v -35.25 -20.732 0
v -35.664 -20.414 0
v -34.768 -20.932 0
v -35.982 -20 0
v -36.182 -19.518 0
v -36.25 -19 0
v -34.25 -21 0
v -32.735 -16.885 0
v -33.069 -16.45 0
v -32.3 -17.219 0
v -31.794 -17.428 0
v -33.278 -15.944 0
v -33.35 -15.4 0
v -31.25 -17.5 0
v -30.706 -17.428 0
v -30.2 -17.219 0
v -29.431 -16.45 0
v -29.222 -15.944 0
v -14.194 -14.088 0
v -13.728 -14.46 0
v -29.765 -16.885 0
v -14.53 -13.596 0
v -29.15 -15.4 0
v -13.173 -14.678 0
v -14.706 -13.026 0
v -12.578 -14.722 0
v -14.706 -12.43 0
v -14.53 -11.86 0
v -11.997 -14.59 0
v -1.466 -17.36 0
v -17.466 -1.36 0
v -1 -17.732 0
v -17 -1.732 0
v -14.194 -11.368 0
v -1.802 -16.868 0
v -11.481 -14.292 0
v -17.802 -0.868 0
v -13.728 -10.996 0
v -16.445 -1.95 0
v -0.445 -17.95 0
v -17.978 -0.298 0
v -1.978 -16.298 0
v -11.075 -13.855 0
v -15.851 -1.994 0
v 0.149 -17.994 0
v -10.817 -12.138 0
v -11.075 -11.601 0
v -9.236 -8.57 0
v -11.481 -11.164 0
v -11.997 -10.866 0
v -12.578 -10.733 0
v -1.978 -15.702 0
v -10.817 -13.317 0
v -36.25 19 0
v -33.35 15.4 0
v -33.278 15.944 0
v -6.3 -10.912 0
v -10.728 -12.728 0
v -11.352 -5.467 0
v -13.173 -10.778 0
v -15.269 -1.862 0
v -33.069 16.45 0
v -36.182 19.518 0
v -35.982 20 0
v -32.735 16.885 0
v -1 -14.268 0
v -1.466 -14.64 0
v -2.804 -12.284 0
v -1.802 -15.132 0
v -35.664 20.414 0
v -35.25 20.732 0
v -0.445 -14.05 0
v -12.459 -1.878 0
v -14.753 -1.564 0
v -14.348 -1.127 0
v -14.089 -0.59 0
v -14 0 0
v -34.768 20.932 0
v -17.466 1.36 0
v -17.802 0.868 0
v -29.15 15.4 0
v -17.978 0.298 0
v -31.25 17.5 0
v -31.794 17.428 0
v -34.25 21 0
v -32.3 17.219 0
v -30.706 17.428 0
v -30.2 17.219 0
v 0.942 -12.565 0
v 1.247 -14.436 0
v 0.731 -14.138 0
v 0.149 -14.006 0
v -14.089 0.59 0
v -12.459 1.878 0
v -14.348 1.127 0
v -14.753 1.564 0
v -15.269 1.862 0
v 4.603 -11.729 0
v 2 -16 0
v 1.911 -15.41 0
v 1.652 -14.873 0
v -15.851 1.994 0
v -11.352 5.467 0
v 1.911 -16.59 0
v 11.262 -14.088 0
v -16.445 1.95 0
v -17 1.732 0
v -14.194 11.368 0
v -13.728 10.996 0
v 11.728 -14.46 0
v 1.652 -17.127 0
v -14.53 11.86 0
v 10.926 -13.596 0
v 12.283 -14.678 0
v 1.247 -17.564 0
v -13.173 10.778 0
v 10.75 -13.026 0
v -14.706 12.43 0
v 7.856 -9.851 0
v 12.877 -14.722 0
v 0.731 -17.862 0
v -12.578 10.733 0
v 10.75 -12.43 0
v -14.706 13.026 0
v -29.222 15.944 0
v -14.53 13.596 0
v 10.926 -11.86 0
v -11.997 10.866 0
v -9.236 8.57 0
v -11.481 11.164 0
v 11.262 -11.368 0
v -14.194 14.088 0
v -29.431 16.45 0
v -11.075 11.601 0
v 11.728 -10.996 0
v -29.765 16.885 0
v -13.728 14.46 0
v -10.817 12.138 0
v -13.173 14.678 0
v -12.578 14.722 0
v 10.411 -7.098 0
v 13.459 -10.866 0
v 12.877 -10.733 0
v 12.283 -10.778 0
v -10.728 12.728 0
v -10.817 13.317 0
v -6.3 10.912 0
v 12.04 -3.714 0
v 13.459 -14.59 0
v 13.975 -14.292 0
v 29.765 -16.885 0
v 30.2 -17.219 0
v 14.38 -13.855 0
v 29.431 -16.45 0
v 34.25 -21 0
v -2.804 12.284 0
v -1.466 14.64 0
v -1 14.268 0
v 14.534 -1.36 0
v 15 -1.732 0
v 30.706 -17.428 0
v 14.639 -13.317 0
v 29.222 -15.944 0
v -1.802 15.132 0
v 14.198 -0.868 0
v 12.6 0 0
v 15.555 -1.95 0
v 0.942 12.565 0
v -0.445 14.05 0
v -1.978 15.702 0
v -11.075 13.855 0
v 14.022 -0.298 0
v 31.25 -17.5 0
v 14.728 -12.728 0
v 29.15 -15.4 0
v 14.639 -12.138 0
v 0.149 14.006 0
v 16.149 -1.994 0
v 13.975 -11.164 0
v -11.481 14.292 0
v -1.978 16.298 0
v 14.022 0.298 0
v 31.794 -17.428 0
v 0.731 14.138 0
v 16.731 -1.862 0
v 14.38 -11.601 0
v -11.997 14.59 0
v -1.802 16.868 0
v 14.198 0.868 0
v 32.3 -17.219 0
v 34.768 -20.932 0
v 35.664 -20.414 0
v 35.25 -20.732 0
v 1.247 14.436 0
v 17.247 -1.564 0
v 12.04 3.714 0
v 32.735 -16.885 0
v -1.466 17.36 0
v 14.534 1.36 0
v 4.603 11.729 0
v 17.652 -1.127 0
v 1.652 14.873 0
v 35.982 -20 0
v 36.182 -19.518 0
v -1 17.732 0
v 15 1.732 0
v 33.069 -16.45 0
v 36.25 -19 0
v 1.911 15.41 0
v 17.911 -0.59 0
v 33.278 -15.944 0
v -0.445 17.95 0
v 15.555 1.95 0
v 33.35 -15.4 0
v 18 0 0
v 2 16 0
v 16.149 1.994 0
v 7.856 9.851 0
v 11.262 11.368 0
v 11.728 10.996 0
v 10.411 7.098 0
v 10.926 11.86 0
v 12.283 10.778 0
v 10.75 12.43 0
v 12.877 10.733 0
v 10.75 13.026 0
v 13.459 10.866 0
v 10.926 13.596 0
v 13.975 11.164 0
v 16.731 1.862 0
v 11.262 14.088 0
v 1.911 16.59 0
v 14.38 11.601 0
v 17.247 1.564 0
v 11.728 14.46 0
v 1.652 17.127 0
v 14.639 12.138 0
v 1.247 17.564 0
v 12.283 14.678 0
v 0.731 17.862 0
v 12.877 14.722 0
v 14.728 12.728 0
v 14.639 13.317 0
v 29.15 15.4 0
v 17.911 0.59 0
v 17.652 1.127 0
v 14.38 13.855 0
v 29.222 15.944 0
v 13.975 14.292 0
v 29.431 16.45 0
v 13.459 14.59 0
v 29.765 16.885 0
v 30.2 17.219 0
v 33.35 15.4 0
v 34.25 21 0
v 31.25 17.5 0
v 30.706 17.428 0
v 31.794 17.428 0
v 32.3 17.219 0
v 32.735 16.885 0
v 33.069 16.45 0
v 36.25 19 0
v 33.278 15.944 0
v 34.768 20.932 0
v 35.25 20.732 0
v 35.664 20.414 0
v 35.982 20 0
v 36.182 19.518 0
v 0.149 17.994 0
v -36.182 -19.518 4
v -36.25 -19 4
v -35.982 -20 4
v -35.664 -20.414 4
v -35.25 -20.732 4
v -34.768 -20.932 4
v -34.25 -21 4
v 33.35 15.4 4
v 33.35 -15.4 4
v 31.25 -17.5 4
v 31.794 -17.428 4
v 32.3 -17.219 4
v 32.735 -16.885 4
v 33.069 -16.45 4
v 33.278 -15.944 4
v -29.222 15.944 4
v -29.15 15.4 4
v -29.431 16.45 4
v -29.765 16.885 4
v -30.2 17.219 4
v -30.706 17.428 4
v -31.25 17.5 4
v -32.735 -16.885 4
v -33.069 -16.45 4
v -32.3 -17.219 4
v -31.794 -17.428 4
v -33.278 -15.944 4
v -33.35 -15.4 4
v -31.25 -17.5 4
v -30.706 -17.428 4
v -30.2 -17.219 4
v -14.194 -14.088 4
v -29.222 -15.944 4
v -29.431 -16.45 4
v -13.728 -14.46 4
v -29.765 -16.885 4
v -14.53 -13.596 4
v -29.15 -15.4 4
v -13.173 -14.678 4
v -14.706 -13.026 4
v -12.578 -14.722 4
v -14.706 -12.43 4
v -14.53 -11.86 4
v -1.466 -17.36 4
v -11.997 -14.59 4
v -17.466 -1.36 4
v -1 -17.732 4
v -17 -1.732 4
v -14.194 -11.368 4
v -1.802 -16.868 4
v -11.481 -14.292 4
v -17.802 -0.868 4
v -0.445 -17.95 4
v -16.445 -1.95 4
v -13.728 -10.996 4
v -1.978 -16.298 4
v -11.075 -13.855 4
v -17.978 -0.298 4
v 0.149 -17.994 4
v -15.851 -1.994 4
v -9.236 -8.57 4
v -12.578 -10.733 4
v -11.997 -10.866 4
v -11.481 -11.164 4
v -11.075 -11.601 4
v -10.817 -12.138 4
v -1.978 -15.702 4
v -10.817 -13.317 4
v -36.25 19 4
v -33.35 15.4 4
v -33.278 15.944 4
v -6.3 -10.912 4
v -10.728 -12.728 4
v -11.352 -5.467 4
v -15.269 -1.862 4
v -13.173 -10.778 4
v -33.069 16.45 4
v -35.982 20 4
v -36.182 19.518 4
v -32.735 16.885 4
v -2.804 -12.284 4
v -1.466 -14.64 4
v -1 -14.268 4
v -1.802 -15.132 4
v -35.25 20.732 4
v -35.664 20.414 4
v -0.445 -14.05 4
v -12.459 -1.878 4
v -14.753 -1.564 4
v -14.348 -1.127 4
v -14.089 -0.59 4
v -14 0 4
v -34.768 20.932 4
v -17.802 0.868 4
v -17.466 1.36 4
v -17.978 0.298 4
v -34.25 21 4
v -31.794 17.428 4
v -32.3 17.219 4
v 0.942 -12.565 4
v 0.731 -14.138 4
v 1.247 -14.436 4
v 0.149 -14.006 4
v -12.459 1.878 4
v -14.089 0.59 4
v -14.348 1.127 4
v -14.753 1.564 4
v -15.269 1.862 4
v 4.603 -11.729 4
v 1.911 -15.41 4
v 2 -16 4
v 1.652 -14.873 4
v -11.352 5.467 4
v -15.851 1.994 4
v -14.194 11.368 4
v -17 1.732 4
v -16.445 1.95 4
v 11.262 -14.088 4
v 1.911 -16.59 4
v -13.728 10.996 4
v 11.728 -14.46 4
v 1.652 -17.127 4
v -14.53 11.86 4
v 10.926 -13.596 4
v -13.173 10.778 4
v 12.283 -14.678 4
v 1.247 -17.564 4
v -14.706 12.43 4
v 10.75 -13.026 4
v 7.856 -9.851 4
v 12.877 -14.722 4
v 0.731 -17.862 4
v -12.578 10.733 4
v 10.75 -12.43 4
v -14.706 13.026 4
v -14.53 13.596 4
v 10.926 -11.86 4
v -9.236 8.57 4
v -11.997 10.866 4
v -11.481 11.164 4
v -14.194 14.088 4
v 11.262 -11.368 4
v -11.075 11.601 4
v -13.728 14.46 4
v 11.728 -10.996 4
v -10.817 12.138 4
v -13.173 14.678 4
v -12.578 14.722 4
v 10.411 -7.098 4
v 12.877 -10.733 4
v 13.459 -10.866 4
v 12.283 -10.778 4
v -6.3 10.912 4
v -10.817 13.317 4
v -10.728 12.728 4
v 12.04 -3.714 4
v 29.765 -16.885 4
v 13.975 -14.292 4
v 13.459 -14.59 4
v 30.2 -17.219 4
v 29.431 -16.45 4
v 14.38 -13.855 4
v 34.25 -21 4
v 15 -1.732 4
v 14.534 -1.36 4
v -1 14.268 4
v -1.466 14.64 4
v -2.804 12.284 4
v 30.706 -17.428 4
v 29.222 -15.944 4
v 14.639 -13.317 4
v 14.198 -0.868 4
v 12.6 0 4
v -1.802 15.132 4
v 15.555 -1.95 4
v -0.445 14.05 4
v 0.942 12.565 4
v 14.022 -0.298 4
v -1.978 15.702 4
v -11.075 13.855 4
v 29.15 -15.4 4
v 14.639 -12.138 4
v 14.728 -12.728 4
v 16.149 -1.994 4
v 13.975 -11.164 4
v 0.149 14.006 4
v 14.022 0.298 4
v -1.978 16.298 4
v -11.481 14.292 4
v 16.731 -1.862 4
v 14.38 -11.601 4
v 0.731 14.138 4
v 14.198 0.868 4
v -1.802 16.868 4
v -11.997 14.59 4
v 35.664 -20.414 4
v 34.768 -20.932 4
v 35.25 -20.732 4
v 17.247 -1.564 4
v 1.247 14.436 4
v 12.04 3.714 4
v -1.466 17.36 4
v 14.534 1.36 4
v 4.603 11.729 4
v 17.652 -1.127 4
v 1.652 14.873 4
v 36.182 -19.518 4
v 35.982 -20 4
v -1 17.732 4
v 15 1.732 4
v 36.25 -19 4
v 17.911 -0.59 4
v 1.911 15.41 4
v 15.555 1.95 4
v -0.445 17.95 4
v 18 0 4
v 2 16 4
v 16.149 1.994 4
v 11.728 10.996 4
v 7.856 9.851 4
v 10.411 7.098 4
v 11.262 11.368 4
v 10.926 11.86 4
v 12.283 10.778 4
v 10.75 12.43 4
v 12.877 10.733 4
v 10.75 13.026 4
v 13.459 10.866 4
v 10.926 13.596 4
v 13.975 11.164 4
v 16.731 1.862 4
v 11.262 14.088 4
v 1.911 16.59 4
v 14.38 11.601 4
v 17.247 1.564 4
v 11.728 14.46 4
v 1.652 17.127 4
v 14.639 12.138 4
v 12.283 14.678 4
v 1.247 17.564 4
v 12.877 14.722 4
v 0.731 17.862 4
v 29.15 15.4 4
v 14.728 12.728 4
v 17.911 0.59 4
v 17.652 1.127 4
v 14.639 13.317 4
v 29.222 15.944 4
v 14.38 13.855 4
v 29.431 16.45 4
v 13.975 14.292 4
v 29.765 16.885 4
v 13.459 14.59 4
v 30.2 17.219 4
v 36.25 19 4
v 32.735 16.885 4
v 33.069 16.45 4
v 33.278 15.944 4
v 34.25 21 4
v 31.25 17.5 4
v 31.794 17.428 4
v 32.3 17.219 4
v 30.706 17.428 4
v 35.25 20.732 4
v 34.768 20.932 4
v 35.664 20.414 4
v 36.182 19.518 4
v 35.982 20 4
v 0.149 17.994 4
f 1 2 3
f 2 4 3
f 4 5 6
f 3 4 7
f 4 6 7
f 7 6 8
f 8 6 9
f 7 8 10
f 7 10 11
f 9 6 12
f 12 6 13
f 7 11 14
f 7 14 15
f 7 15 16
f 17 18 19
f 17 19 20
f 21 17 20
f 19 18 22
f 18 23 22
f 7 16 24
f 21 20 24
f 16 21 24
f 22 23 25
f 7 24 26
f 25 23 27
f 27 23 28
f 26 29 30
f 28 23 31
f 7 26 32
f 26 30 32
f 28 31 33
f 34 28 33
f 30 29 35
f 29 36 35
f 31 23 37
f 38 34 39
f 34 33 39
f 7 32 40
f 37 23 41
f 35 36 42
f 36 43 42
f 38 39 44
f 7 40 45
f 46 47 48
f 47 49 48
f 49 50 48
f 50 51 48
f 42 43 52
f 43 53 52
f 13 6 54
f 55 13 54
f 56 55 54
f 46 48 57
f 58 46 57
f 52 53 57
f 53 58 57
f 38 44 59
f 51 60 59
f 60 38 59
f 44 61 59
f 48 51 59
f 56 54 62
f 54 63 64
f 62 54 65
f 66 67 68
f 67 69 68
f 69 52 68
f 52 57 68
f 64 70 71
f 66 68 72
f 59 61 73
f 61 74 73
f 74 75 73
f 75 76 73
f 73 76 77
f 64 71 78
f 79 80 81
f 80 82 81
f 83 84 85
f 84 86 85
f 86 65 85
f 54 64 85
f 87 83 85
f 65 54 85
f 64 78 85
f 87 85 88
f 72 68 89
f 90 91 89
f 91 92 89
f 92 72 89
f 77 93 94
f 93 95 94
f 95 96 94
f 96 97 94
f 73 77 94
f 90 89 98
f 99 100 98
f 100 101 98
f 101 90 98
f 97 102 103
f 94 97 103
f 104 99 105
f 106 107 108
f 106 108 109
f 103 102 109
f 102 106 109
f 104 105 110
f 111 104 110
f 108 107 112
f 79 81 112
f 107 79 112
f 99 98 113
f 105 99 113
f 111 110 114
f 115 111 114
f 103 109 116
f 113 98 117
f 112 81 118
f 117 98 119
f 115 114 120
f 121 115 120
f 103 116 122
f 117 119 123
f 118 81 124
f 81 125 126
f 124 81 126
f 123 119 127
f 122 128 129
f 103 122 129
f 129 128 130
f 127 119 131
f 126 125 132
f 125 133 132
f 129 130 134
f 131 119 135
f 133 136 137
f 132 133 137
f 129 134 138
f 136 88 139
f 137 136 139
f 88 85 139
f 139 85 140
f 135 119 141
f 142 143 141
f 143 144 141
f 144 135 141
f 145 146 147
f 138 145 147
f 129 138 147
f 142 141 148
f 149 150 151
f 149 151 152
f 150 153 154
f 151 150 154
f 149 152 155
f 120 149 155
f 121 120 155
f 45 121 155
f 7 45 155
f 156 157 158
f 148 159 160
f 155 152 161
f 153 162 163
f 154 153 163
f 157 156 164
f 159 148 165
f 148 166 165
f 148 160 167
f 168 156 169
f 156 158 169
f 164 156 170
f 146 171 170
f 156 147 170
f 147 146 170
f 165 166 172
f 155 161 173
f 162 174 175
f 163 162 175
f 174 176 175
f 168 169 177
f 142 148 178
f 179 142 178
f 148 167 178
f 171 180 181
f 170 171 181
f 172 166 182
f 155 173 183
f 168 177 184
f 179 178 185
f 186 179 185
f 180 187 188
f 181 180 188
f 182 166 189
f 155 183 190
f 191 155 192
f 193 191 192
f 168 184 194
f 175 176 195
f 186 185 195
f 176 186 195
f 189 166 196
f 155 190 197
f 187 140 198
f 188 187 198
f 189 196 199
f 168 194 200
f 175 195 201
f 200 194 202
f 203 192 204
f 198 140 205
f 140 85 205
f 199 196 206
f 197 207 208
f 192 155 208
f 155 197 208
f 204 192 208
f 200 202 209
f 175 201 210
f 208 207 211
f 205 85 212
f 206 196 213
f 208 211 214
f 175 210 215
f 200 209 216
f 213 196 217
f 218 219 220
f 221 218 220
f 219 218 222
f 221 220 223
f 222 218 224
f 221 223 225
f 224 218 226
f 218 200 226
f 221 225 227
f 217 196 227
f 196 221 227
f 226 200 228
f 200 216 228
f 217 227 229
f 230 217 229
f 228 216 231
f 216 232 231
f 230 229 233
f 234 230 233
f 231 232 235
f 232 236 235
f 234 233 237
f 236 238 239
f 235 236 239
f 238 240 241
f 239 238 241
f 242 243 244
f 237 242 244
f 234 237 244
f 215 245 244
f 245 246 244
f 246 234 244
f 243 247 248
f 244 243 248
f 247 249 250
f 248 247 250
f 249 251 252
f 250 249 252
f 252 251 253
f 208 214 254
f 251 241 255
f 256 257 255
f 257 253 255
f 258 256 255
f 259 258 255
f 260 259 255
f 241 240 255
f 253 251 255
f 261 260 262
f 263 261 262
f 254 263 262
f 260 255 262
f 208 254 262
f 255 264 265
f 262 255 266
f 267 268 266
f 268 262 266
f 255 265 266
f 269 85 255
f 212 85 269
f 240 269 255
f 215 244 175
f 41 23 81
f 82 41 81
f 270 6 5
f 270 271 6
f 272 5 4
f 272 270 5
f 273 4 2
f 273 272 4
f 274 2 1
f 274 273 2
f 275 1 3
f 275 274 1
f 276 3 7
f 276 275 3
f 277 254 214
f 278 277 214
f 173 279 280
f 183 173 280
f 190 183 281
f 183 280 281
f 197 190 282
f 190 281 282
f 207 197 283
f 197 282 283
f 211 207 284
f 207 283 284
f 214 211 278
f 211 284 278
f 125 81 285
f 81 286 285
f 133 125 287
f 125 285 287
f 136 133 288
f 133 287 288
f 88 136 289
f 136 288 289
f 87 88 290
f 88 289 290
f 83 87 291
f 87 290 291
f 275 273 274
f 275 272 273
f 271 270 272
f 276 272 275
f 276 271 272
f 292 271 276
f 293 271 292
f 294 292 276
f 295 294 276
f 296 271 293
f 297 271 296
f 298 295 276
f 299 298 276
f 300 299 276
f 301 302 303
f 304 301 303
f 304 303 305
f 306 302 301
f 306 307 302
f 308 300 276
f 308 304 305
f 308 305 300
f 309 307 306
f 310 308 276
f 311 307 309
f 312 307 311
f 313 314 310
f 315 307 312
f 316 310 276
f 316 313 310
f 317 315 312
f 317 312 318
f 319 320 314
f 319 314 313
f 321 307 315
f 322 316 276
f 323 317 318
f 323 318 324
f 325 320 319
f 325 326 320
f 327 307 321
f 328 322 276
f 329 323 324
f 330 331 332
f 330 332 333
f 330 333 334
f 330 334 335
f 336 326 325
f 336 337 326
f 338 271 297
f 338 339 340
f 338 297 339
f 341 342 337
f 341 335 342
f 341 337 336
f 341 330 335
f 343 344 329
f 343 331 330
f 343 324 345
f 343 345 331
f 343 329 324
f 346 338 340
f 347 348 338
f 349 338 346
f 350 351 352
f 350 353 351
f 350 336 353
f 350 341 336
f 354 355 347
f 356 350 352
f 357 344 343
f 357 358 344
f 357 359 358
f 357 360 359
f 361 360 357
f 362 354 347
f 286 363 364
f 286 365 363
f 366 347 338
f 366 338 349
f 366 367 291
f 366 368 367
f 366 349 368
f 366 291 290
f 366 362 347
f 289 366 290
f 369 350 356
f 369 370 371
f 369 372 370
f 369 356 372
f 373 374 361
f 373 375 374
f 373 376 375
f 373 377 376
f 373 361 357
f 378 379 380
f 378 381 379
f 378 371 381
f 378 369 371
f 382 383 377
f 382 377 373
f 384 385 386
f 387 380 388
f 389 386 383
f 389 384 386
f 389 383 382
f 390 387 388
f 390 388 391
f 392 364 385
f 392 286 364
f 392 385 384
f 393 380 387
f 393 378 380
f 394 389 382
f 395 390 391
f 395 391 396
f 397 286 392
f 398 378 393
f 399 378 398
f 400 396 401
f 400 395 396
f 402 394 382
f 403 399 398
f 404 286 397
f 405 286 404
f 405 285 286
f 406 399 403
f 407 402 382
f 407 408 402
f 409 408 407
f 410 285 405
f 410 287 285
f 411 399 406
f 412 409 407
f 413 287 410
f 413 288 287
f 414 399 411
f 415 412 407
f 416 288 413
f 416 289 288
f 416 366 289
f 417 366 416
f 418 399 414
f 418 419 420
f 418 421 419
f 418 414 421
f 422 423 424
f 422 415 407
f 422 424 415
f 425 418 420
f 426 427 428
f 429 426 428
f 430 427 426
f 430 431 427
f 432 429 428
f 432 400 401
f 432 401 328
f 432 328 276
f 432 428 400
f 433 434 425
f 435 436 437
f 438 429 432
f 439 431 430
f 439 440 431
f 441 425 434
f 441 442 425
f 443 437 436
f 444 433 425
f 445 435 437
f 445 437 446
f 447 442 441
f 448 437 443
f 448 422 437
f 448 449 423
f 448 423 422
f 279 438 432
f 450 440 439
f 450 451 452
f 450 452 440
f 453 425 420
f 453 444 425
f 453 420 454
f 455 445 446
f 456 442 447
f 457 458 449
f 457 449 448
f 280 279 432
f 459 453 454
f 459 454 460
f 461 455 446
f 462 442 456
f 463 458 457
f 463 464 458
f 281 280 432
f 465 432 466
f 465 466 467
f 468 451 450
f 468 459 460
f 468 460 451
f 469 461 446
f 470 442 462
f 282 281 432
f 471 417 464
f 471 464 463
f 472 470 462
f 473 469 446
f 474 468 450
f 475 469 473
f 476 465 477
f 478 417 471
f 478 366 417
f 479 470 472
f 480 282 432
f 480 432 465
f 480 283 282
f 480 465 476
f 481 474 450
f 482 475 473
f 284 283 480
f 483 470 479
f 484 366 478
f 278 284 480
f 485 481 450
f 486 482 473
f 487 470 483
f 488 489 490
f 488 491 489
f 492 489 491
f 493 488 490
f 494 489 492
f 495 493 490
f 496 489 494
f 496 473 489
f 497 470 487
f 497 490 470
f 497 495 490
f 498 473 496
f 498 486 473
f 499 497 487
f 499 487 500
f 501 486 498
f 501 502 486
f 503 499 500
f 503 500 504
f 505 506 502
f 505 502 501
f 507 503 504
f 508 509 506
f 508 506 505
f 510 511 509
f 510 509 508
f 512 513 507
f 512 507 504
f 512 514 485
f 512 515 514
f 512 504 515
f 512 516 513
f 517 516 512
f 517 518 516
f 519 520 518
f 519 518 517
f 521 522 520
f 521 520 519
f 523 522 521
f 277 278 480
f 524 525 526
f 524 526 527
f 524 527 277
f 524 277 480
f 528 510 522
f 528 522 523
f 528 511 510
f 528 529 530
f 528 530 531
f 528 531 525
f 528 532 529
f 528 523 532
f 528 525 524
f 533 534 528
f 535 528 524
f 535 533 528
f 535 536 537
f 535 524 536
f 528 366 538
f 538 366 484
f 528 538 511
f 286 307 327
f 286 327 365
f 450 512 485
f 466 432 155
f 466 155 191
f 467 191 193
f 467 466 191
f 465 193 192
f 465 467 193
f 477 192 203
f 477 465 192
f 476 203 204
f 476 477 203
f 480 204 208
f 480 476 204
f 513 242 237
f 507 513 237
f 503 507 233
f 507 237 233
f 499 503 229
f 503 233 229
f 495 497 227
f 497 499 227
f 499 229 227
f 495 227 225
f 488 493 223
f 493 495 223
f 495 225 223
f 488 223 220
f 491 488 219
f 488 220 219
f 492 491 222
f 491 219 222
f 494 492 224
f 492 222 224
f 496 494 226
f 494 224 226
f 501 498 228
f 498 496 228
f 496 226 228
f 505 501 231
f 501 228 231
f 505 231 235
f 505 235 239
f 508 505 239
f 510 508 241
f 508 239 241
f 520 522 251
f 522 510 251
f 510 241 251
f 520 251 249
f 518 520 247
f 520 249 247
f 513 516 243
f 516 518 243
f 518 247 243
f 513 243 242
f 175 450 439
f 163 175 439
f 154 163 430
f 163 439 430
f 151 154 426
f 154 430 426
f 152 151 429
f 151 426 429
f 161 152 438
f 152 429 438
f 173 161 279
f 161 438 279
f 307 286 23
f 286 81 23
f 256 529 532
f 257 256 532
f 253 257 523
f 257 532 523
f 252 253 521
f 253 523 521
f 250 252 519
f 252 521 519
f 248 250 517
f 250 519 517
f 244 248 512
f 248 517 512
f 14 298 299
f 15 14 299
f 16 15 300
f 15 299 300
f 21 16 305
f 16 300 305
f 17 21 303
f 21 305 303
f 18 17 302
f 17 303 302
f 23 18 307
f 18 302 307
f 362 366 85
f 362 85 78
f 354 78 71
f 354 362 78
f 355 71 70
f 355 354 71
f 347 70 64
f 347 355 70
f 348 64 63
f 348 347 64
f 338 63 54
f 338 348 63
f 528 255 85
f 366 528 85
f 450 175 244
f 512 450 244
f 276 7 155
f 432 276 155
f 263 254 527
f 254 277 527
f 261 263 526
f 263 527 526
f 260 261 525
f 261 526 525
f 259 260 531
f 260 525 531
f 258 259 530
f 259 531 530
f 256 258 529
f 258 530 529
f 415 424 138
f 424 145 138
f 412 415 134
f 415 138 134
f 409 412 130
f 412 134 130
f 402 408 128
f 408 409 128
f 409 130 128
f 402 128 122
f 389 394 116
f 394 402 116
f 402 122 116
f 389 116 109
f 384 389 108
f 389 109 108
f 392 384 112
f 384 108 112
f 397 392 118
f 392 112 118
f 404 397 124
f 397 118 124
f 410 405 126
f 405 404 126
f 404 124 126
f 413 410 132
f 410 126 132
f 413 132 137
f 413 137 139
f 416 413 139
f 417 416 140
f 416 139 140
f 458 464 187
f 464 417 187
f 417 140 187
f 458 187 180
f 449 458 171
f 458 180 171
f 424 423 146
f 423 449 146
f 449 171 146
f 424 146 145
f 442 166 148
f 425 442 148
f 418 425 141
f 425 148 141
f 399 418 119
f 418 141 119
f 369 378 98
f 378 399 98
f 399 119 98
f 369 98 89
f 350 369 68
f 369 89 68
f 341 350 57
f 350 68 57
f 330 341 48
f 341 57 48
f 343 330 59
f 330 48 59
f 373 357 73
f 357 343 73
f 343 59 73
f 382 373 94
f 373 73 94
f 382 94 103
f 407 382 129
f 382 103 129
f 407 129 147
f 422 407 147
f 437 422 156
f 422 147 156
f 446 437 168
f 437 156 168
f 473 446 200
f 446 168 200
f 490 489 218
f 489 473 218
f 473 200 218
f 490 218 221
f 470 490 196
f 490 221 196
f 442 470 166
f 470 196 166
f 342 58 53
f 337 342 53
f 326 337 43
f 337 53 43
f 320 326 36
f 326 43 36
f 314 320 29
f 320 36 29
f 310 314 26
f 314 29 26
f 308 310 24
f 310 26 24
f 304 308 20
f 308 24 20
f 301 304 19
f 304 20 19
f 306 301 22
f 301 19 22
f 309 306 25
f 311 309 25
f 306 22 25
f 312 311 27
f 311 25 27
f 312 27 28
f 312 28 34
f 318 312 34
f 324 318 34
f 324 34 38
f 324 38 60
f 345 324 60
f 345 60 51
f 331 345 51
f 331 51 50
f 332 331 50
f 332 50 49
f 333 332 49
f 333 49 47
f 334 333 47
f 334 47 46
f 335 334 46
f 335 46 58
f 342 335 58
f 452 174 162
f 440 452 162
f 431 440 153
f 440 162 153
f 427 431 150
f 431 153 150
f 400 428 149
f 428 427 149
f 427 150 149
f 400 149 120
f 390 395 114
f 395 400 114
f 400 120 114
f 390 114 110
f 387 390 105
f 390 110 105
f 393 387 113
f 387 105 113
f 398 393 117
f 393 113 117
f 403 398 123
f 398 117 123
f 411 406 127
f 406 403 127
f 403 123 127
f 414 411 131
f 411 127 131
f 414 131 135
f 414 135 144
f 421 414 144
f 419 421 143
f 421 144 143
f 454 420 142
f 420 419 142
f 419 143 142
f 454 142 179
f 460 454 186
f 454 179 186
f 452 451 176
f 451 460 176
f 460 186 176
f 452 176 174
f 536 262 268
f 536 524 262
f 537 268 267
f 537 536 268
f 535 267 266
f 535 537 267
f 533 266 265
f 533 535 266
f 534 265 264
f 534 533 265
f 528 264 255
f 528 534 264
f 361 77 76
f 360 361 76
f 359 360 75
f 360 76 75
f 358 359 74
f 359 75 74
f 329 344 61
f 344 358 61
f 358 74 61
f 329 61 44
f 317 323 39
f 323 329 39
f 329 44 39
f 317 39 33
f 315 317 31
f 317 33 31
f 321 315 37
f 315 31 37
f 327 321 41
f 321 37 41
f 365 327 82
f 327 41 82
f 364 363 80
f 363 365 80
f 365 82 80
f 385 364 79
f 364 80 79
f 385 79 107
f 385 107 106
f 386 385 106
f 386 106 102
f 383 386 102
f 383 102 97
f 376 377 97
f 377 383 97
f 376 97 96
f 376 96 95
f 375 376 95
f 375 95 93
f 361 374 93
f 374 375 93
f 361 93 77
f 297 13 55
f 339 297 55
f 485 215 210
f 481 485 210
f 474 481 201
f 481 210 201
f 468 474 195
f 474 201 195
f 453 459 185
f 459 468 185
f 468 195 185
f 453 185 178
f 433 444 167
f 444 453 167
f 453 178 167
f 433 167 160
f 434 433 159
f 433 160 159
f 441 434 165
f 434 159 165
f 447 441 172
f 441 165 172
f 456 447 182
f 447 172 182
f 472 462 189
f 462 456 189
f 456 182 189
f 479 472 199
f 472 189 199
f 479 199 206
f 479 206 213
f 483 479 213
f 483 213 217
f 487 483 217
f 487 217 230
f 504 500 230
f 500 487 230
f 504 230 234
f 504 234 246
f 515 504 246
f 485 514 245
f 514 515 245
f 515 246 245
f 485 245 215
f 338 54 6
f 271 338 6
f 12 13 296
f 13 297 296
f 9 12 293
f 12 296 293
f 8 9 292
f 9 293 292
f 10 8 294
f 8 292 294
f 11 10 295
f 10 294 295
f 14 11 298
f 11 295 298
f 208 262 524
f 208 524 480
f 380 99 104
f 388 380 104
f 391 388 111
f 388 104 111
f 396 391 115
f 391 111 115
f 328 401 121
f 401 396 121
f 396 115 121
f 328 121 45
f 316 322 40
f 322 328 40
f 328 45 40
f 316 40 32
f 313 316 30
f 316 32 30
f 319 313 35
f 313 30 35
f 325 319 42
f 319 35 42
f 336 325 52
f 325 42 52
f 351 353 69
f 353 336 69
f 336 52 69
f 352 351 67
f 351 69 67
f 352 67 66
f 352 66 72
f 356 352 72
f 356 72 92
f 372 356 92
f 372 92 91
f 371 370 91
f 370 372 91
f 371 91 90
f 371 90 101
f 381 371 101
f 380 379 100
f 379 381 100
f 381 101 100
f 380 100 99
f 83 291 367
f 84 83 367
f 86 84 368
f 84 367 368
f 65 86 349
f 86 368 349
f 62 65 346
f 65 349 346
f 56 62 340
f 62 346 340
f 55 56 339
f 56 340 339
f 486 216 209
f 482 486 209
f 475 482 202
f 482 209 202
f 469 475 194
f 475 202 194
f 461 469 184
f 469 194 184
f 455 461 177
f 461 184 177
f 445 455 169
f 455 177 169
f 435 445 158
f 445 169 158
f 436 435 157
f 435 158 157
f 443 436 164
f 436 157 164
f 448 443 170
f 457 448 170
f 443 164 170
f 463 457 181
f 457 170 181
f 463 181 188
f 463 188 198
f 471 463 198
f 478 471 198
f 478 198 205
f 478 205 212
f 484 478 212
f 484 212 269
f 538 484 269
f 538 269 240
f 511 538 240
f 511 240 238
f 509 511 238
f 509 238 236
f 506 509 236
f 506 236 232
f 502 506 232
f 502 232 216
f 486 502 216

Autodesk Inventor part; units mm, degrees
ref_plane "YZ Plane" through (0, 0, 0) normal (1, 0, 0) x (0, 1, 0)
ref_plane "XZ Plane" through (0, 0, 0) normal (0, 1, 0) x (-1, 0, 0)
ref_plane "XY Plane" through (0, 0, 0) normal (0, 0, 1) x (1, 0, 0)
sketch "Sketch1" plane through (0, 0, 0) normal (0, 0, 1) x (1, 0, 0)
  circle A0 centre (0, 0) radius 21
  circle A1 centre (16, 0) radius 2
  circle A2 centre (0, 16) radius 2
  circle A3 centre (-16, 0) radius 2
  circle A4 centre (0, -16) radius 2
  line L0 (-14.8492, -14.8492) -> (14.8492, 14.8492)
  line L1 (0, -21) -> (0, 21)
  circle A5 centre (11.3137, 11.3137) radius 1.5
  circle A6 centre (0, 0) radius 12.6
  line L2 (-36.25, -21) -> (36.25, -21)
  line L3 (36.25, 21) -> (-36.25, 21)
  line L4 (-21, -21) -> (21, 21) construction
  line L5 (21, -21) -> (-21, 21) construction
  line L6 (-36.25, 21) -> (-36.25, -21)
  line L7 (36.25, 21) -> (36.25, -21)
  line L8 (-33.35, 17.5) -> (-29.15, 17.5)
  line L9 (-29.15, 17.5) -> (-29.15, -17.5)
  line L10 (-29.15, -17.5) -> (-33.35, -17.5)
  line L11 (-33.35, -17.5) -> (-33.35, 17.5)
  line L12 (-33.35, 17.5) -> (-29.15, -17.5) construction
  line L13 (-29.15, 17.5) -> (-33.35, -17.5) construction
  line L14 (29.15, 17.5) -> (33.35, 17.5)
  line L15 (33.35, 17.5) -> (33.35, -17.5)
  line L16 (33.35, -17.5) -> (29.15, -17.5)
  line L17 (29.15, -17.5) -> (29.15, 17.5)
  line L18 (29.15, 17.5) -> (33.35, -17.5) construction
  line L19 (33.35, 17.5) -> (29.15, -17.5) construction
  line L20 (-26.25, 21) -> (-26.25, -21)
  line L21 (26.25, 21) -> (26.25, -21)
  circle A7 centre (-12.7279, -12.7279) radius 1.621 projected
  circle A8 centre (0, 0) radius 12.5 projected
  circle A9 centre (-12.7279, -12.7279) radius 2 projected
  circle A10 centre (12.7279, 12.7279) radius 2 projected
  circle A11 centre (-12.7279, 12.7279) radius 2 projected
  circle A12 centre (12.7279, -12.7279) radius 2 projected
  circle A13 centre (16, 0) radius 1.6 projected
  circle A14 centre (-16, 0) radius 1.6 projected
  circle A15 centre (0, 16) radius 1.6 projected
  circle A16 centre (0, -16) radius 1.6 projected
  circle A17 centre (0, 0) radius 20.7 projected
  point P0 (-18.984, 8.9782)
  point P1 (-18.984, -8.9782)
  point P2 (-31.25, 0)
  point P3 (31.25, 0)
  point P4 (-31.25, 0)
  point P5 (31.25, 0)
  point P6 (31.25, 0)
  point P7 (31.25, 21)
  point P8 (-31.25, 0)
  point P9 (-31.25, 21)
  point P10 (31.25, 21)
  point P11 (0, 21)
  point P12 (0, -21)
  dimension "d0" = 42
  dimension "d1" = 4
  dimension "d5" = 16
  dimension "d8" = 360
  dimension "d10" = 45
  dimension "d11" = 3
  dimension "d12" = 16
  dimension "d19" = 25.2
  dimension "d31" = 4.2
  dimension "d32" = 35
  dimension "d33" = 4.2
  dimension "d38" = 5
  dimension "d39" = 5
  dimension "d40" = 72.5
  dimension "d41" = 10
  dimension "d42" = 10
extrude "Extrusion1" add sketch "Sketch1" along normal blind 4 contours A0 L1 A17 L0 | A0 L3 L21 L2 | L0 A17 L1 A0 | L2 L20 L3 A0 | A0 L0 A17 L1 | L1 A17 L0 A0 | A17 L1 A4 A6 L0 A5 A10 | L0 A10 A5 A6 L1 A2 A17 | A17 L0 A9 A6 L1 A4 | L2 L6 L3 L20 | L21 L3 L7 L2 | L1 A2 A6 L0 A9 A17 | A10 L0 A5 | A10 A5 L0 picked at (10.8037, 11.1549) picked at (11.1549, 10.8037)
fillet "Fillet1" radius 2 4 edges at (-36.25, 21, 2) (-36.25, -21, 2) (36.25, -21, 2) (36.25, 21, 2)
fillet "Fillet2" radius 2.1 8 edges at (33.35, -17.5, 2) (29.15, -17.5, 2) (29.15, 17.5, 2) (33.35, 17.5, 2) (-33.35, 17.5, 2) (-29.15, 17.5, 2) (-29.15, -17.5, 2) (-33.35, -17.5, 2)
equation "\"d39\" = d38"
equation "\"d42\" = d41"
properties part number "mounting plate stepper motor base 4 mm" material "Aluminum 6061"
